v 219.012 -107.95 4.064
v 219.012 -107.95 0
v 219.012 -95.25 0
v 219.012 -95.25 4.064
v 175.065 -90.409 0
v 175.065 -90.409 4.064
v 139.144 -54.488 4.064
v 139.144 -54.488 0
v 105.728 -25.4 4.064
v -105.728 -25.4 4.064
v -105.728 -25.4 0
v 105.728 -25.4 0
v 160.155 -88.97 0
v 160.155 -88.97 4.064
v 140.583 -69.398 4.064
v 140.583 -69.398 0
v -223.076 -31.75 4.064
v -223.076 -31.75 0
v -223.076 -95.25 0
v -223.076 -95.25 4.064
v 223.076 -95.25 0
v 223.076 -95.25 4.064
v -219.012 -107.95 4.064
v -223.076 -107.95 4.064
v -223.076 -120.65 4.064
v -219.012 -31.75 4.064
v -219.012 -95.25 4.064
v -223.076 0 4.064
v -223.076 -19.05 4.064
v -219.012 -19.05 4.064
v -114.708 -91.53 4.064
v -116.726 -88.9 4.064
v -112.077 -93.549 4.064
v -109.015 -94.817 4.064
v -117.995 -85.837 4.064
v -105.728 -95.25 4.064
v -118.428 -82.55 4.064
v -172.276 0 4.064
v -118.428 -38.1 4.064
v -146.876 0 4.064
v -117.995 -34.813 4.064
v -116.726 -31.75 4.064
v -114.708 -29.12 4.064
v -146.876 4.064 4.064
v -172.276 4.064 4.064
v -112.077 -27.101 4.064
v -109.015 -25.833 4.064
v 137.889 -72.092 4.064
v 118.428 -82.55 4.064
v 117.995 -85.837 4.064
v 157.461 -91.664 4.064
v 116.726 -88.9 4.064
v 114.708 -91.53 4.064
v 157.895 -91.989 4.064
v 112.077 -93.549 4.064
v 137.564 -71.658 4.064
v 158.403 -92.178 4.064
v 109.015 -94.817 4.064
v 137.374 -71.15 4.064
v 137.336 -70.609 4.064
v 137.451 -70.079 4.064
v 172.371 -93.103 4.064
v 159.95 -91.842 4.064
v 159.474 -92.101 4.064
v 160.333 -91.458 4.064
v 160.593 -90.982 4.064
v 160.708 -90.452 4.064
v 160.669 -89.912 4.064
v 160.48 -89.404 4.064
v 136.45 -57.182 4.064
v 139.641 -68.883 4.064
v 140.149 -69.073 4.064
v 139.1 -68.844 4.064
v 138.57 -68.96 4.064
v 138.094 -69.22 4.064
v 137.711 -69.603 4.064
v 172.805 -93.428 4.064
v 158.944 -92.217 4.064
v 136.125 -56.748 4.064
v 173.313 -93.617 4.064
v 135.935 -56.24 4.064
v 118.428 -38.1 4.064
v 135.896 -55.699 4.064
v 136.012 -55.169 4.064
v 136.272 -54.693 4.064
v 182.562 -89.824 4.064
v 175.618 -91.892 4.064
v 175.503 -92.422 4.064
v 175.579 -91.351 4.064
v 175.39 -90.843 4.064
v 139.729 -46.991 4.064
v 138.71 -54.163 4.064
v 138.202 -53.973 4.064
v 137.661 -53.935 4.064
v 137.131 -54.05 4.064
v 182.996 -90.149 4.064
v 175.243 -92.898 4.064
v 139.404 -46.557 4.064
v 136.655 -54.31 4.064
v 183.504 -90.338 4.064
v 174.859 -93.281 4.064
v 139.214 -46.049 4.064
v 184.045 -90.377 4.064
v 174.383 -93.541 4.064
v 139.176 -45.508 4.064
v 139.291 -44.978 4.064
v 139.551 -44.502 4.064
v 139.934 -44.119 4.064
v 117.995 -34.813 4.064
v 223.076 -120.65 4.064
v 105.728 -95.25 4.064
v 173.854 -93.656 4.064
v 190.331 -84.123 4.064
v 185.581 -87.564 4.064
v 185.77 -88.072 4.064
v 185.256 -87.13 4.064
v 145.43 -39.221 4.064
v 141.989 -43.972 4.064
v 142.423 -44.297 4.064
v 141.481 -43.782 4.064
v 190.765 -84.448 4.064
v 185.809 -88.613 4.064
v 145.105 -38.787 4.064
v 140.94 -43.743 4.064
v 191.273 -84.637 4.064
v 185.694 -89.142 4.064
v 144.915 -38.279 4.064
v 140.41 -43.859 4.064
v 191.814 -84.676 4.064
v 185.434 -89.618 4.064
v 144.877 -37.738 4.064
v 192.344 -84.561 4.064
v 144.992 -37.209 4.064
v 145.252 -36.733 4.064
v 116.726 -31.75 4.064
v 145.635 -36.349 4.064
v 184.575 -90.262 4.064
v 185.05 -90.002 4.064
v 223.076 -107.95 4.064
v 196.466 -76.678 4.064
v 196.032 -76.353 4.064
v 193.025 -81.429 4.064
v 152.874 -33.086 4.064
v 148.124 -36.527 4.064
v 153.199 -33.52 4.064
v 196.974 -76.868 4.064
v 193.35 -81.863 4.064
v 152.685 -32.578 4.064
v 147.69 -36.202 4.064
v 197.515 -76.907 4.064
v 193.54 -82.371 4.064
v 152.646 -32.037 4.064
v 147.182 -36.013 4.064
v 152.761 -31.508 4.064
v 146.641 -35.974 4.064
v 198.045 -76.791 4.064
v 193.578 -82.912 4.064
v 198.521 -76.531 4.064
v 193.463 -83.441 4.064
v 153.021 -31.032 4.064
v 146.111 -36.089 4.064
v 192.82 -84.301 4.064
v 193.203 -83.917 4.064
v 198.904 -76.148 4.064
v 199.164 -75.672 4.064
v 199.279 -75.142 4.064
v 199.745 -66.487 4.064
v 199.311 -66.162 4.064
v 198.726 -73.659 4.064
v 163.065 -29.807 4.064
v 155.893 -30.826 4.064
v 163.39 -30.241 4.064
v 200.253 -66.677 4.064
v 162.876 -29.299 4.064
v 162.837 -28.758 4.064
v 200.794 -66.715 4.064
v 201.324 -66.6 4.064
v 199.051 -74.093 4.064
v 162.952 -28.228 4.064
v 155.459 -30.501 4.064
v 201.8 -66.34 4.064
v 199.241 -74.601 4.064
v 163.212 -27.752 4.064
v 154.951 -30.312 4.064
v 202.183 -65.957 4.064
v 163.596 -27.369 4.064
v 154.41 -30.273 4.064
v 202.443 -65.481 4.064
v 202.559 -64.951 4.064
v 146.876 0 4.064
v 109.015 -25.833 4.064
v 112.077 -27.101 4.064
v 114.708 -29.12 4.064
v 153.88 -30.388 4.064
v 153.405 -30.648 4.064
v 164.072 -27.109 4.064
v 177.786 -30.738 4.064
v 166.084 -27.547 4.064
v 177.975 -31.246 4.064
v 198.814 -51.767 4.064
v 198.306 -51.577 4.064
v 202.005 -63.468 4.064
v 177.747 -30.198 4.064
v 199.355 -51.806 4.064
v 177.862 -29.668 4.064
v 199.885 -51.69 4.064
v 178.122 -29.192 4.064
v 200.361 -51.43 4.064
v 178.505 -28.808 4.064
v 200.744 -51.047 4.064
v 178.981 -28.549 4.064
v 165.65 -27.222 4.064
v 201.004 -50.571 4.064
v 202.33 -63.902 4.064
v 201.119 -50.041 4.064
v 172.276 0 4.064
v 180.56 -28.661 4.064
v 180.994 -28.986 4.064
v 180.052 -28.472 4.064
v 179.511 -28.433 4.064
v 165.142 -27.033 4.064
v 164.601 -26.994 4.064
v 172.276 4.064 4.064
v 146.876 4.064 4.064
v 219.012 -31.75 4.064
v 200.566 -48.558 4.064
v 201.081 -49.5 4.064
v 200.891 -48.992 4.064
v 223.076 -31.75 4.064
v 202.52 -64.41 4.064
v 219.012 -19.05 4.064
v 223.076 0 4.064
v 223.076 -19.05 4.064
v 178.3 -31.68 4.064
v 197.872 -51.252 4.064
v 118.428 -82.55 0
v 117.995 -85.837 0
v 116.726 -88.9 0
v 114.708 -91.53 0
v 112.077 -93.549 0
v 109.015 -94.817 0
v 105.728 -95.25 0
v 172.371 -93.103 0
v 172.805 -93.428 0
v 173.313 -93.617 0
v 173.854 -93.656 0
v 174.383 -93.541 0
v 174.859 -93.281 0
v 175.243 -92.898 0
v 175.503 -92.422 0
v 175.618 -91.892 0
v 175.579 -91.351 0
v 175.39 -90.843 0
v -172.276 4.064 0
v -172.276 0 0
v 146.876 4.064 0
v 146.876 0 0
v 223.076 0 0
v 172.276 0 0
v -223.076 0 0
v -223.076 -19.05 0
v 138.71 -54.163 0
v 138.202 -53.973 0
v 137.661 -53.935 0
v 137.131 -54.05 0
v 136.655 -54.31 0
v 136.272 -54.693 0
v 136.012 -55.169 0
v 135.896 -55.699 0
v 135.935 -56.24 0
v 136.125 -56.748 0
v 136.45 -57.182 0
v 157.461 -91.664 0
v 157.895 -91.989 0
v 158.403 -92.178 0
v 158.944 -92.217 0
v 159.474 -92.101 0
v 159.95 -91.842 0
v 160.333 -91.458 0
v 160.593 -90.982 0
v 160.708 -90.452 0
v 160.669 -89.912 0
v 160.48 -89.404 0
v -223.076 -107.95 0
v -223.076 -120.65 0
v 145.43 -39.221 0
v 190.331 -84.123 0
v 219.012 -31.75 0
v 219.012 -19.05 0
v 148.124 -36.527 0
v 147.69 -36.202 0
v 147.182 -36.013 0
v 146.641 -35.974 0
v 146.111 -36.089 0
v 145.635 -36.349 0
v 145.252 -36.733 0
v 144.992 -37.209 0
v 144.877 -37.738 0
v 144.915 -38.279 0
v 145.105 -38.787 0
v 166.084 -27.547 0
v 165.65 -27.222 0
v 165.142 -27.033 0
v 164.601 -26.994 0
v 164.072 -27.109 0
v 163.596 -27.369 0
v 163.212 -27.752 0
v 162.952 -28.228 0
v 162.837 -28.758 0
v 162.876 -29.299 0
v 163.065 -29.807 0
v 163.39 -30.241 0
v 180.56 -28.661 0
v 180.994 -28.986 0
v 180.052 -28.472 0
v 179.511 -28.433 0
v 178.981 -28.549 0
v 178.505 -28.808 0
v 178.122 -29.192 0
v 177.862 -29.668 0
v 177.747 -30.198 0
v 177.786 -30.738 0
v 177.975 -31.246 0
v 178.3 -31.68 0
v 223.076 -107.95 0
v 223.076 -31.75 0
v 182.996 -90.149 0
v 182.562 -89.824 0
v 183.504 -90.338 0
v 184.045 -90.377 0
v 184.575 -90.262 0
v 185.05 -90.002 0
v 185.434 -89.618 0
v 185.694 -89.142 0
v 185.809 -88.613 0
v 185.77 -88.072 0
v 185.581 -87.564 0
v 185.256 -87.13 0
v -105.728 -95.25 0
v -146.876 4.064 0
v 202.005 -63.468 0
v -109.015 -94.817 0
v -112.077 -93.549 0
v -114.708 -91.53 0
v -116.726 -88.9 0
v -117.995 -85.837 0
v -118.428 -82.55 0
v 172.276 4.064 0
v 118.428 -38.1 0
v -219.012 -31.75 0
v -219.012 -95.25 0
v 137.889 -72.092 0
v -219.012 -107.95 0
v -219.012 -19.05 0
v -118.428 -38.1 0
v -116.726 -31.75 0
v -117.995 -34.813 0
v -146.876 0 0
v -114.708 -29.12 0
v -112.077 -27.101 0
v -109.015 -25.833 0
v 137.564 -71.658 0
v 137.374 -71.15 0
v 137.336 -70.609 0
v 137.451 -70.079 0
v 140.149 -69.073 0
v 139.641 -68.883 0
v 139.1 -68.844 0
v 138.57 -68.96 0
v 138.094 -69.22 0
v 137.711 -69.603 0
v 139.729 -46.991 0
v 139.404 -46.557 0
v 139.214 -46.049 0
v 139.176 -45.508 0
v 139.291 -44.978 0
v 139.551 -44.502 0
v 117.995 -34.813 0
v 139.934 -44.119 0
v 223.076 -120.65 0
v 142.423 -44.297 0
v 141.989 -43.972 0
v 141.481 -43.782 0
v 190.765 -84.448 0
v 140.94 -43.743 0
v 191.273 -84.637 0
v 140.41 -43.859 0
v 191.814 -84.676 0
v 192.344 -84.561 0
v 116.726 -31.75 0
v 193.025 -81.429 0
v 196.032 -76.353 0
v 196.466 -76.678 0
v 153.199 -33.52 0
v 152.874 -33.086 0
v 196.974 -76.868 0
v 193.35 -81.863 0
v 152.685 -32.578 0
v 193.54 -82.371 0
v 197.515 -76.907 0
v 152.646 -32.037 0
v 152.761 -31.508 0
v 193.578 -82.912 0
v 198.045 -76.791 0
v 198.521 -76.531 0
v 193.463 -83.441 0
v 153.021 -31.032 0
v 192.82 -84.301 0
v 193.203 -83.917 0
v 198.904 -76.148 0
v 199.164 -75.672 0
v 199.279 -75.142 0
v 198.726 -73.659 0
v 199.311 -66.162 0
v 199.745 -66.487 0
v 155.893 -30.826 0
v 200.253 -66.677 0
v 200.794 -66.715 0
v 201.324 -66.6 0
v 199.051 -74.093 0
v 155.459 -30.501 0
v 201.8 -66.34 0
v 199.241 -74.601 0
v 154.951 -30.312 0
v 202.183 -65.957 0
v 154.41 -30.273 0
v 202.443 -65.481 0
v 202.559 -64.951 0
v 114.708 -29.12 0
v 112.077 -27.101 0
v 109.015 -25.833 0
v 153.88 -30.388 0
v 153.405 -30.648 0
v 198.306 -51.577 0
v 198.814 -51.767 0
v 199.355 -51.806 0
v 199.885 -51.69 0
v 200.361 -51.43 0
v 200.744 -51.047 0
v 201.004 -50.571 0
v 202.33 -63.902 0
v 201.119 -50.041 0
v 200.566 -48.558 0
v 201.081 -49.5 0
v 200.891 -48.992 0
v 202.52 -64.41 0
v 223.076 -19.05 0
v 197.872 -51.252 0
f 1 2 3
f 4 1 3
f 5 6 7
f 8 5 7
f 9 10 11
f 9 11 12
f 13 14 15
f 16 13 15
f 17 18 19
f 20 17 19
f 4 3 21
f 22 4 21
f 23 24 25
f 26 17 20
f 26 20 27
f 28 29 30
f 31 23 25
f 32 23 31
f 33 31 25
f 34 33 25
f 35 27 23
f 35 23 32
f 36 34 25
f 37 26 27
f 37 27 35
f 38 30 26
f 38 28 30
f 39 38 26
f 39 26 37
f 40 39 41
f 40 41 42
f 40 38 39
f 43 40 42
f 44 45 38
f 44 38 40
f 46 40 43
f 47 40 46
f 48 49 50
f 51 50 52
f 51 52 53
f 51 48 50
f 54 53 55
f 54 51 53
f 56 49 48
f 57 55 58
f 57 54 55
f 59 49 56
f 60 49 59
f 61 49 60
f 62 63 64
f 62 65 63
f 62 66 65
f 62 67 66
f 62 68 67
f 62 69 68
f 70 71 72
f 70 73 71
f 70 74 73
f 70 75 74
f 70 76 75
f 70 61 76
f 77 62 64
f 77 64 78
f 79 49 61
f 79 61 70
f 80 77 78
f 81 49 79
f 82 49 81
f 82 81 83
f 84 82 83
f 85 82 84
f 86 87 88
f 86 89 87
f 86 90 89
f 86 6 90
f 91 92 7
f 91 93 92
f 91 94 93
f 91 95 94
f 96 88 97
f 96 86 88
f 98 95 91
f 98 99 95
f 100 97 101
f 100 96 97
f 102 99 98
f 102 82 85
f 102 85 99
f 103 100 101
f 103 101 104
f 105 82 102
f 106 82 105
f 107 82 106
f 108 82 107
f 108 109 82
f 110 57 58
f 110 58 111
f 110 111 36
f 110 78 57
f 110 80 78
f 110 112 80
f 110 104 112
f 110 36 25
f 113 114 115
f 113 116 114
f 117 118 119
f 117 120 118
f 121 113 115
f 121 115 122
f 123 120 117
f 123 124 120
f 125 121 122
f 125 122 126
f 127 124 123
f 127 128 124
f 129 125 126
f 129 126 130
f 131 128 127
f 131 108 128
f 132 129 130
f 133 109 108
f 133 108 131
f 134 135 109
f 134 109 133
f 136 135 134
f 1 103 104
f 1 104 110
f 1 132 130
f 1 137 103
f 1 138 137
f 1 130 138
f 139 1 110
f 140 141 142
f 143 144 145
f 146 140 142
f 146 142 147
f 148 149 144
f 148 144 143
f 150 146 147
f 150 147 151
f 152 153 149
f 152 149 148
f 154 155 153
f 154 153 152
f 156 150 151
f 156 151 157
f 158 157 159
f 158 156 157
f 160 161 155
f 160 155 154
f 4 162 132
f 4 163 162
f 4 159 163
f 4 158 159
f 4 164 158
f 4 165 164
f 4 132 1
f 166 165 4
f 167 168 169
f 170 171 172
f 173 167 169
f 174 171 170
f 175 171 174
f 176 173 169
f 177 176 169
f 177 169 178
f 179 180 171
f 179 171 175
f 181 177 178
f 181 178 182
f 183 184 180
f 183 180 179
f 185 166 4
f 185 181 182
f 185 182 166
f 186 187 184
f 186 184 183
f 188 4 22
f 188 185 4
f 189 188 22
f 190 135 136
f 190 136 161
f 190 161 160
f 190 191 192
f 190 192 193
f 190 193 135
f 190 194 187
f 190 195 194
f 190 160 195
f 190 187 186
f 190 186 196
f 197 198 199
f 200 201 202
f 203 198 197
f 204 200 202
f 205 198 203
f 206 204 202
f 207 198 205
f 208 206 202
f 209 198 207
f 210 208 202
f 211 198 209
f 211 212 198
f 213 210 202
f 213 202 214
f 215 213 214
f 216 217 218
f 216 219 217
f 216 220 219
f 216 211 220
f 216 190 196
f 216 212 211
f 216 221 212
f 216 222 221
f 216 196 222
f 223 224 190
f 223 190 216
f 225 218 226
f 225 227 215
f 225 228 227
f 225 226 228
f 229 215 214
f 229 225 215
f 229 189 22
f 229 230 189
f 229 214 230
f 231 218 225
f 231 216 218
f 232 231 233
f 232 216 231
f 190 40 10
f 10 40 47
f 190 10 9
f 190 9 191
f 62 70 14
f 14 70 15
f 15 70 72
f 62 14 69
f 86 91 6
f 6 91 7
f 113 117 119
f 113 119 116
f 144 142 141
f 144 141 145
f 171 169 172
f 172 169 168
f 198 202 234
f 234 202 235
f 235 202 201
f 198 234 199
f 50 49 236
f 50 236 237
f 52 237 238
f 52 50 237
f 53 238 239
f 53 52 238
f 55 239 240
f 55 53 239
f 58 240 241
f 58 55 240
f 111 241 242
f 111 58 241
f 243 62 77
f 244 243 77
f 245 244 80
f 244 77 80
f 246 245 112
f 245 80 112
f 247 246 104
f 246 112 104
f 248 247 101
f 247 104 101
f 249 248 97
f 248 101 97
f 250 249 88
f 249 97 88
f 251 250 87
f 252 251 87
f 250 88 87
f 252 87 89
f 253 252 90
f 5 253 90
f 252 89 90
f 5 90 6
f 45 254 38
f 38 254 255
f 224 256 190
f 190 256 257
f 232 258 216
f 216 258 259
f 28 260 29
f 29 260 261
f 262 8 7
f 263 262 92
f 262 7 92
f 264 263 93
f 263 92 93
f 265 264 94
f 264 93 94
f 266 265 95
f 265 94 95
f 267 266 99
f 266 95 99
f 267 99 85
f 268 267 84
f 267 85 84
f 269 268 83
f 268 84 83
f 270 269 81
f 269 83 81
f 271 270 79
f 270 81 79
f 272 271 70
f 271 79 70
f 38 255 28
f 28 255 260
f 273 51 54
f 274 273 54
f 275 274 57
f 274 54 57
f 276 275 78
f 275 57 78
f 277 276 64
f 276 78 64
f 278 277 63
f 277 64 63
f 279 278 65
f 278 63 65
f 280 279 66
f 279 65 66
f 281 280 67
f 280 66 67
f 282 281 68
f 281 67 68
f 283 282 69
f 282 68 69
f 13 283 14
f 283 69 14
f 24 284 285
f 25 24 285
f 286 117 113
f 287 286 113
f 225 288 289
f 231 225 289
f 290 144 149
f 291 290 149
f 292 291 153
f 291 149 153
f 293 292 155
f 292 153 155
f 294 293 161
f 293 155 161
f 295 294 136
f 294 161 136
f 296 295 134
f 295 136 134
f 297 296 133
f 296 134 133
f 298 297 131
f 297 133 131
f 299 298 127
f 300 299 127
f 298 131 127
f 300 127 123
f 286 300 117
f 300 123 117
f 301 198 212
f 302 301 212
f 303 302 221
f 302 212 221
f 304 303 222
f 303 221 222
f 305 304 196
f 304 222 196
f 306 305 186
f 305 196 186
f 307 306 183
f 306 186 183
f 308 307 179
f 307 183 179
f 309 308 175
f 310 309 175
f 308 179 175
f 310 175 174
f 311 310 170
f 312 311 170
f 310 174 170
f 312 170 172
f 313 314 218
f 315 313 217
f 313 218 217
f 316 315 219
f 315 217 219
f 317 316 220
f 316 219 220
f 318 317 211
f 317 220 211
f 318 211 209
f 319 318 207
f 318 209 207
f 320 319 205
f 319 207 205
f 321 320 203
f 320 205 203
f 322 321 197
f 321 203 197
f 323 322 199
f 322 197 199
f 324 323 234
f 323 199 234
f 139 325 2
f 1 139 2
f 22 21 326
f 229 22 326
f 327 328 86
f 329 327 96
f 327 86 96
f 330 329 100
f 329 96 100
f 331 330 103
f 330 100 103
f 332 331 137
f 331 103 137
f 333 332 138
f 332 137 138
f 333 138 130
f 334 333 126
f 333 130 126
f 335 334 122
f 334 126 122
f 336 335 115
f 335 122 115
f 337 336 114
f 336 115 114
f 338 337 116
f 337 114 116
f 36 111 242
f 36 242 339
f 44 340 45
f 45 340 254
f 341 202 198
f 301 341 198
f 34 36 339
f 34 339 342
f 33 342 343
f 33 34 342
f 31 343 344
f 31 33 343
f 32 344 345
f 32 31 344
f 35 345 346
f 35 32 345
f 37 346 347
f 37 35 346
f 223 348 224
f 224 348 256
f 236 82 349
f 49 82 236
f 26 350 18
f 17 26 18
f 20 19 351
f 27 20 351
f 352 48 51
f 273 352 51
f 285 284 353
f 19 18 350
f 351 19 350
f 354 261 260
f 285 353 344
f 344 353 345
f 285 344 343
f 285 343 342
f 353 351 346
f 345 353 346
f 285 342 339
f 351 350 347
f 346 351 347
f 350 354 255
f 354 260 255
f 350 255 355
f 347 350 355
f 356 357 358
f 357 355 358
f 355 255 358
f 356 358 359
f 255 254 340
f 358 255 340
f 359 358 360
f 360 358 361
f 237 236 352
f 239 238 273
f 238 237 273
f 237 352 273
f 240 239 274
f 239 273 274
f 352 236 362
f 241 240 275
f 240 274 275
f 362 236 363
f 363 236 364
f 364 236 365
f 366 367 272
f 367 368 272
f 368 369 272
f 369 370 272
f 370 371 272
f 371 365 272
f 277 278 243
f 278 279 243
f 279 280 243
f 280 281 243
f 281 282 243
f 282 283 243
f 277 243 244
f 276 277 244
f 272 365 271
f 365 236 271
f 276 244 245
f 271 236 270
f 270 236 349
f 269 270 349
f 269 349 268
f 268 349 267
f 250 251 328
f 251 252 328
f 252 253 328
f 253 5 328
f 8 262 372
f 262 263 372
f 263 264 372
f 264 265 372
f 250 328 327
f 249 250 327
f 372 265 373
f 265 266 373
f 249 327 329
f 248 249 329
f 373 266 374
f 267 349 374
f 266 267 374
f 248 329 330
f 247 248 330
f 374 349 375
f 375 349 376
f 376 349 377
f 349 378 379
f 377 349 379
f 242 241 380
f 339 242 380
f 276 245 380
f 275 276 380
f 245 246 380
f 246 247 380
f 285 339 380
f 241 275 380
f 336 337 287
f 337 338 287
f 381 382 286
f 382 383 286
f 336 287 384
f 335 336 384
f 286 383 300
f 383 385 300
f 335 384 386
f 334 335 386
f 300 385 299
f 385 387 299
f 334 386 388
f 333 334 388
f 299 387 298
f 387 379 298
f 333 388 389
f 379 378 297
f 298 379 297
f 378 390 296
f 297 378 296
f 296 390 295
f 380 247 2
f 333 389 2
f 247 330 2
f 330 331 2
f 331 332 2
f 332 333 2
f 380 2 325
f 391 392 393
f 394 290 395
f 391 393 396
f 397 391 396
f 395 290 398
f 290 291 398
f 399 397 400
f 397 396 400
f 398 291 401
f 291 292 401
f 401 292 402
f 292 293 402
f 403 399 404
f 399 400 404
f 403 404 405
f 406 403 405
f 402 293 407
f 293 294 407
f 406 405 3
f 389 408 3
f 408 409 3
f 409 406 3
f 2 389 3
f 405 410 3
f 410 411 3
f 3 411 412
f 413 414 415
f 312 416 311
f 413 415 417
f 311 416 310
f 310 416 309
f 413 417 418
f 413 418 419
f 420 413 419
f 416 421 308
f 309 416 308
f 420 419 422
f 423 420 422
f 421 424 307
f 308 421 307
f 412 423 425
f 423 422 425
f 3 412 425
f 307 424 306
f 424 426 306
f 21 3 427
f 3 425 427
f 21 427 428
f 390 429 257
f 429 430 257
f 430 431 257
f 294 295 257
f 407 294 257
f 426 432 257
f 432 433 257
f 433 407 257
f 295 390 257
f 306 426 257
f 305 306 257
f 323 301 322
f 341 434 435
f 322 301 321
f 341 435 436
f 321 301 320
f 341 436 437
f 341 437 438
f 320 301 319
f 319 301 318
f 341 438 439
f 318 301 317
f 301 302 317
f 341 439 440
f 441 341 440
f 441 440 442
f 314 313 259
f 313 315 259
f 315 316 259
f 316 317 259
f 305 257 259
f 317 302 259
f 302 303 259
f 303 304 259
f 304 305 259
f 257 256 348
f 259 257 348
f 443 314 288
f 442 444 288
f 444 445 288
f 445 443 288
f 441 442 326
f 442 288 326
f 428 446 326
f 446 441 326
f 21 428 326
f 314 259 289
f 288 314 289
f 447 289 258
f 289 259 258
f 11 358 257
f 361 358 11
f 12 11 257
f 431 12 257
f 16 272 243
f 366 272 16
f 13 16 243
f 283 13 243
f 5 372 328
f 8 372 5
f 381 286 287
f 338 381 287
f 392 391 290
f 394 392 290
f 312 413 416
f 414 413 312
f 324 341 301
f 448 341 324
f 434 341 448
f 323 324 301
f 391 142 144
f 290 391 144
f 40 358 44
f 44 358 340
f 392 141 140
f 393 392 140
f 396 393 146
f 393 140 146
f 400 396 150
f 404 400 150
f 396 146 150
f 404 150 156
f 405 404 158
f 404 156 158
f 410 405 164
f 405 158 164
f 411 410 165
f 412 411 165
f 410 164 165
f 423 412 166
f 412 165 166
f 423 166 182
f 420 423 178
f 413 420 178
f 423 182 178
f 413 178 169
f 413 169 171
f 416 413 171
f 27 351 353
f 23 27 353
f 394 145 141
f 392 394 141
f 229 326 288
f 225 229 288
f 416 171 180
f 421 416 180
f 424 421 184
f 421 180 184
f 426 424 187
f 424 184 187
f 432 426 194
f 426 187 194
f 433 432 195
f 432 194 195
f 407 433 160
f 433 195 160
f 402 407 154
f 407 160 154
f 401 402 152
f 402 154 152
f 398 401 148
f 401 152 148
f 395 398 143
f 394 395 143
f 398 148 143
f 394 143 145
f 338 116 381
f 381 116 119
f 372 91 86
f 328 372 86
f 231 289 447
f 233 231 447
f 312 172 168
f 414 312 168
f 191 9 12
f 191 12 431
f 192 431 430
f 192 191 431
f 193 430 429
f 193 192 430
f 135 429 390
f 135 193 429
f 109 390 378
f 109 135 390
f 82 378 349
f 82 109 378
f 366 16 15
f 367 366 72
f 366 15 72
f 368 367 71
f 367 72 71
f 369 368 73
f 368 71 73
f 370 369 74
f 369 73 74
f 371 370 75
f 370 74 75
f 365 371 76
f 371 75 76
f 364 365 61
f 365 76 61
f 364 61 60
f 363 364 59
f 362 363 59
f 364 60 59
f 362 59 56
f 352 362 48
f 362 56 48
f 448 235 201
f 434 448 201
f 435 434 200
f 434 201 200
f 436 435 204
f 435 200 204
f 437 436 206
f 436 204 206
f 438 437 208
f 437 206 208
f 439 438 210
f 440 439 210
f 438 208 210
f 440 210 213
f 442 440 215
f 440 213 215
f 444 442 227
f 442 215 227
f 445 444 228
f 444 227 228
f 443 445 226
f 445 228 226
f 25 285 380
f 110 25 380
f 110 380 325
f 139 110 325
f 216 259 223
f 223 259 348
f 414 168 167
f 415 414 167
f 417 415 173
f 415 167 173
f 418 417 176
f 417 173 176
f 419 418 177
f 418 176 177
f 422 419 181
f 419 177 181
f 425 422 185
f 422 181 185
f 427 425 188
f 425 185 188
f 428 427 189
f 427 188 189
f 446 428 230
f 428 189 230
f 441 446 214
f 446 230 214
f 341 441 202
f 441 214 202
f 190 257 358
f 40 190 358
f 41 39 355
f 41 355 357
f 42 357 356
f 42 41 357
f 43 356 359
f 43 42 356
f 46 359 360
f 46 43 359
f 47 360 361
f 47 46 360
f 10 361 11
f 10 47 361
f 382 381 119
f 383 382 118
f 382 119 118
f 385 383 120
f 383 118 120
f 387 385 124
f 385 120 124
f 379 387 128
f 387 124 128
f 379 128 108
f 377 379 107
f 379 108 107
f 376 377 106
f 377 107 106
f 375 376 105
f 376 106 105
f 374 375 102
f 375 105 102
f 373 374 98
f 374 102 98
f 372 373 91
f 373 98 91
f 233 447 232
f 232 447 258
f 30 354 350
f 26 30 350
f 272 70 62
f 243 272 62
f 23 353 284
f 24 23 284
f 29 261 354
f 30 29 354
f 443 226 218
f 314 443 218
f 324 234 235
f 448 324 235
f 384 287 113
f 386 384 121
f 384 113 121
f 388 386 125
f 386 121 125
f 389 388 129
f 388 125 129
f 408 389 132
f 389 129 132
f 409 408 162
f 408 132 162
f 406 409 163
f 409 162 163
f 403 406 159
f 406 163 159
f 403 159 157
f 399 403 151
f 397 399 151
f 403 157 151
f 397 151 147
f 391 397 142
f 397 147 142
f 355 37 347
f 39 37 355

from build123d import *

# Parameters (mm, degrees)
BOSS_EXTRUDE1_DEPTH = 4.064
CUT_EXTRUDE1_DEPTH  = 5.08


with BuildPart() as part:
    # Sketch1 → Boss-Extrude1 (new body)
    with BuildSketch(Plane.XY):
        Polygon((-223.0755, -19.05), (-219.0115, -19.05), (-219.0115, -31.75), (-223.0755, -31.75), (-223.0755, -95.25), (-219.0115, -95.25), (-219.0115, -107.95), (-223.0755, -107.95), (-223.0755, -120.65), (223.0755, -120.65), (223.0755, -107.95), (219.0115, -107.95), (219.0115, -95.25), (223.0755, -95.25), (223.0755, -31.75), (219.0115, -31.75), (219.0115, -19.05), (223.0755, -19.05), (223.0755, 0), (172.2755, 0), (172.2755, 4.064), (146.8755, 4.064), (146.8755, 0), (-146.8755, 0), (-146.8755, 4.064), (-172.2755, 4.064), (-172.2755, 0), (-223.0755, 0), align=None)
    extrude(amount=BOSS_EXTRUDE1_DEPTH)

    # Sketch2 → Cut-Extrude1 (cut)
    with BuildSketch(Plane.XY.offset(4.064)):
        with BuildLine():
            Line((-105.7275, -25.4), (105.7275, -25.4))
            ThreePointArc((105.7275, -25.4), (114.707756121, -29.119743879), (118.4275, -38.1))
            Line((118.4275, -38.1), (118.4275, -82.55))
            ThreePointArc((118.4275, -82.55), (114.707756121, -91.530256121), (105.7275, -95.25))
            Line((105.7275, -95.25), (-105.7275, -95.25))
            ThreePointArc((-105.7275, -95.25), (-114.707756121, -91.530256121), (-118.4275, -82.55))
            Line((-118.4275, -82.55), (-118.4275, -38.1))
            ThreePointArc((-118.4275, -38.1), (-114.707756121, -29.119743879), (-105.7275, -25.4))
        make_face()
        with BuildLine():
            Line((137.88887808, -72.091607461), (157.460892539, -91.66362192))
            ThreePointArc((157.460892539, -91.66362192), (160.154969375, -91.66362192), (160.154969375, -88.969545084))
            Line((160.154969375, -88.969545084), (140.582954916, -69.397530625))
            ThreePointArc((140.582954916, -69.397530625), (137.88887808, -69.397530625), (137.88887808, -72.091607461))
        make_face()
        with BuildLine():
            Line((175.064666479, -90.408858006), (139.143641994, -54.487833521))
            ThreePointArc((139.143641994, -54.487833521), (136.449565158, -54.487833521), (136.449565158, -57.181910358))
            Line((136.449565158, -57.181910358), (172.370589642, -93.102934842))
            ThreePointArc((172.370589642, -93.102934842), (175.064666479, -93.102934842), (175.064666479, -90.408858006))
        make_face()
        with BuildLine():
            Line((139.728723609, -46.990684627), (182.561815373, -89.823776391))
            ThreePointArc((182.561815373, -89.823776391), (185.255892209, -89.823776391), (185.255892209, -87.129699554))
            Line((185.255892209, -87.129699554), (142.422800446, -44.296607791))
            ThreePointArc((142.422800446, -44.296607791), (139.728723609, -44.296607791), (139.728723609, -46.990684627))
        make_face()
        with BuildLine():
            Line((145.429821279, -39.221398115), (190.331101885, -84.122678721))
            ThreePointArc((190.331101885, -84.122678721), (193.025178721, -84.122678721), (193.025178721, -81.428601885))
            Line((193.025178721, -81.428601885), (148.123898115, -36.527321279))
            ThreePointArc((148.123898115, -36.527321279), (145.429821279, -36.527321279), (145.429821279, -39.221398115))
        make_face()
        with BuildLine():
            Line((153.199107791, -33.520300446), (196.032199554, -76.353392209))
            ThreePointArc((196.032199554, -76.353392209), (198.726276391, -76.353392209), (198.726276391, -73.659315373))
            Line((198.726276391, -73.659315373), (155.893184627, -30.826223609))
            ThreePointArc((155.893184627, -30.826223609), (153.199107791, -30.826223609), (153.199107791, -33.520300446))
        make_face()
        with BuildLine():
            Line((202.005434842, -63.468089642), (166.084410358, -27.547065158))
            ThreePointArc((166.084410358, -27.547065158), (163.390333521, -27.547065158), (163.390333521, -30.241141994))
            Line((163.390333521, -30.241141994), (199.311358006, -66.162166479))
            ThreePointArc((199.311358006, -66.162166479), (202.005434842, -66.162166479), (202.005434842, -63.468089642))
        make_face()
        with BuildLine():
            Line((178.300030625, -31.680454916), (197.872045084, -51.252469375))
            ThreePointArc((197.872045084, -51.252469375), (200.56612192, -51.252469375), (200.56612192, -48.558392539))
            Line((200.56612192, -48.558392539), (180.994107461, -28.98637808))
            ThreePointArc((180.994107461, -28.98637808), (178.300030625, -28.98637808), (178.300030625, -31.680454916))
        make_face()
    extrude(amount=-CUT_EXTRUDE1_DEPTH, mode=Mode.SUBTRACT)


solid = part.part
